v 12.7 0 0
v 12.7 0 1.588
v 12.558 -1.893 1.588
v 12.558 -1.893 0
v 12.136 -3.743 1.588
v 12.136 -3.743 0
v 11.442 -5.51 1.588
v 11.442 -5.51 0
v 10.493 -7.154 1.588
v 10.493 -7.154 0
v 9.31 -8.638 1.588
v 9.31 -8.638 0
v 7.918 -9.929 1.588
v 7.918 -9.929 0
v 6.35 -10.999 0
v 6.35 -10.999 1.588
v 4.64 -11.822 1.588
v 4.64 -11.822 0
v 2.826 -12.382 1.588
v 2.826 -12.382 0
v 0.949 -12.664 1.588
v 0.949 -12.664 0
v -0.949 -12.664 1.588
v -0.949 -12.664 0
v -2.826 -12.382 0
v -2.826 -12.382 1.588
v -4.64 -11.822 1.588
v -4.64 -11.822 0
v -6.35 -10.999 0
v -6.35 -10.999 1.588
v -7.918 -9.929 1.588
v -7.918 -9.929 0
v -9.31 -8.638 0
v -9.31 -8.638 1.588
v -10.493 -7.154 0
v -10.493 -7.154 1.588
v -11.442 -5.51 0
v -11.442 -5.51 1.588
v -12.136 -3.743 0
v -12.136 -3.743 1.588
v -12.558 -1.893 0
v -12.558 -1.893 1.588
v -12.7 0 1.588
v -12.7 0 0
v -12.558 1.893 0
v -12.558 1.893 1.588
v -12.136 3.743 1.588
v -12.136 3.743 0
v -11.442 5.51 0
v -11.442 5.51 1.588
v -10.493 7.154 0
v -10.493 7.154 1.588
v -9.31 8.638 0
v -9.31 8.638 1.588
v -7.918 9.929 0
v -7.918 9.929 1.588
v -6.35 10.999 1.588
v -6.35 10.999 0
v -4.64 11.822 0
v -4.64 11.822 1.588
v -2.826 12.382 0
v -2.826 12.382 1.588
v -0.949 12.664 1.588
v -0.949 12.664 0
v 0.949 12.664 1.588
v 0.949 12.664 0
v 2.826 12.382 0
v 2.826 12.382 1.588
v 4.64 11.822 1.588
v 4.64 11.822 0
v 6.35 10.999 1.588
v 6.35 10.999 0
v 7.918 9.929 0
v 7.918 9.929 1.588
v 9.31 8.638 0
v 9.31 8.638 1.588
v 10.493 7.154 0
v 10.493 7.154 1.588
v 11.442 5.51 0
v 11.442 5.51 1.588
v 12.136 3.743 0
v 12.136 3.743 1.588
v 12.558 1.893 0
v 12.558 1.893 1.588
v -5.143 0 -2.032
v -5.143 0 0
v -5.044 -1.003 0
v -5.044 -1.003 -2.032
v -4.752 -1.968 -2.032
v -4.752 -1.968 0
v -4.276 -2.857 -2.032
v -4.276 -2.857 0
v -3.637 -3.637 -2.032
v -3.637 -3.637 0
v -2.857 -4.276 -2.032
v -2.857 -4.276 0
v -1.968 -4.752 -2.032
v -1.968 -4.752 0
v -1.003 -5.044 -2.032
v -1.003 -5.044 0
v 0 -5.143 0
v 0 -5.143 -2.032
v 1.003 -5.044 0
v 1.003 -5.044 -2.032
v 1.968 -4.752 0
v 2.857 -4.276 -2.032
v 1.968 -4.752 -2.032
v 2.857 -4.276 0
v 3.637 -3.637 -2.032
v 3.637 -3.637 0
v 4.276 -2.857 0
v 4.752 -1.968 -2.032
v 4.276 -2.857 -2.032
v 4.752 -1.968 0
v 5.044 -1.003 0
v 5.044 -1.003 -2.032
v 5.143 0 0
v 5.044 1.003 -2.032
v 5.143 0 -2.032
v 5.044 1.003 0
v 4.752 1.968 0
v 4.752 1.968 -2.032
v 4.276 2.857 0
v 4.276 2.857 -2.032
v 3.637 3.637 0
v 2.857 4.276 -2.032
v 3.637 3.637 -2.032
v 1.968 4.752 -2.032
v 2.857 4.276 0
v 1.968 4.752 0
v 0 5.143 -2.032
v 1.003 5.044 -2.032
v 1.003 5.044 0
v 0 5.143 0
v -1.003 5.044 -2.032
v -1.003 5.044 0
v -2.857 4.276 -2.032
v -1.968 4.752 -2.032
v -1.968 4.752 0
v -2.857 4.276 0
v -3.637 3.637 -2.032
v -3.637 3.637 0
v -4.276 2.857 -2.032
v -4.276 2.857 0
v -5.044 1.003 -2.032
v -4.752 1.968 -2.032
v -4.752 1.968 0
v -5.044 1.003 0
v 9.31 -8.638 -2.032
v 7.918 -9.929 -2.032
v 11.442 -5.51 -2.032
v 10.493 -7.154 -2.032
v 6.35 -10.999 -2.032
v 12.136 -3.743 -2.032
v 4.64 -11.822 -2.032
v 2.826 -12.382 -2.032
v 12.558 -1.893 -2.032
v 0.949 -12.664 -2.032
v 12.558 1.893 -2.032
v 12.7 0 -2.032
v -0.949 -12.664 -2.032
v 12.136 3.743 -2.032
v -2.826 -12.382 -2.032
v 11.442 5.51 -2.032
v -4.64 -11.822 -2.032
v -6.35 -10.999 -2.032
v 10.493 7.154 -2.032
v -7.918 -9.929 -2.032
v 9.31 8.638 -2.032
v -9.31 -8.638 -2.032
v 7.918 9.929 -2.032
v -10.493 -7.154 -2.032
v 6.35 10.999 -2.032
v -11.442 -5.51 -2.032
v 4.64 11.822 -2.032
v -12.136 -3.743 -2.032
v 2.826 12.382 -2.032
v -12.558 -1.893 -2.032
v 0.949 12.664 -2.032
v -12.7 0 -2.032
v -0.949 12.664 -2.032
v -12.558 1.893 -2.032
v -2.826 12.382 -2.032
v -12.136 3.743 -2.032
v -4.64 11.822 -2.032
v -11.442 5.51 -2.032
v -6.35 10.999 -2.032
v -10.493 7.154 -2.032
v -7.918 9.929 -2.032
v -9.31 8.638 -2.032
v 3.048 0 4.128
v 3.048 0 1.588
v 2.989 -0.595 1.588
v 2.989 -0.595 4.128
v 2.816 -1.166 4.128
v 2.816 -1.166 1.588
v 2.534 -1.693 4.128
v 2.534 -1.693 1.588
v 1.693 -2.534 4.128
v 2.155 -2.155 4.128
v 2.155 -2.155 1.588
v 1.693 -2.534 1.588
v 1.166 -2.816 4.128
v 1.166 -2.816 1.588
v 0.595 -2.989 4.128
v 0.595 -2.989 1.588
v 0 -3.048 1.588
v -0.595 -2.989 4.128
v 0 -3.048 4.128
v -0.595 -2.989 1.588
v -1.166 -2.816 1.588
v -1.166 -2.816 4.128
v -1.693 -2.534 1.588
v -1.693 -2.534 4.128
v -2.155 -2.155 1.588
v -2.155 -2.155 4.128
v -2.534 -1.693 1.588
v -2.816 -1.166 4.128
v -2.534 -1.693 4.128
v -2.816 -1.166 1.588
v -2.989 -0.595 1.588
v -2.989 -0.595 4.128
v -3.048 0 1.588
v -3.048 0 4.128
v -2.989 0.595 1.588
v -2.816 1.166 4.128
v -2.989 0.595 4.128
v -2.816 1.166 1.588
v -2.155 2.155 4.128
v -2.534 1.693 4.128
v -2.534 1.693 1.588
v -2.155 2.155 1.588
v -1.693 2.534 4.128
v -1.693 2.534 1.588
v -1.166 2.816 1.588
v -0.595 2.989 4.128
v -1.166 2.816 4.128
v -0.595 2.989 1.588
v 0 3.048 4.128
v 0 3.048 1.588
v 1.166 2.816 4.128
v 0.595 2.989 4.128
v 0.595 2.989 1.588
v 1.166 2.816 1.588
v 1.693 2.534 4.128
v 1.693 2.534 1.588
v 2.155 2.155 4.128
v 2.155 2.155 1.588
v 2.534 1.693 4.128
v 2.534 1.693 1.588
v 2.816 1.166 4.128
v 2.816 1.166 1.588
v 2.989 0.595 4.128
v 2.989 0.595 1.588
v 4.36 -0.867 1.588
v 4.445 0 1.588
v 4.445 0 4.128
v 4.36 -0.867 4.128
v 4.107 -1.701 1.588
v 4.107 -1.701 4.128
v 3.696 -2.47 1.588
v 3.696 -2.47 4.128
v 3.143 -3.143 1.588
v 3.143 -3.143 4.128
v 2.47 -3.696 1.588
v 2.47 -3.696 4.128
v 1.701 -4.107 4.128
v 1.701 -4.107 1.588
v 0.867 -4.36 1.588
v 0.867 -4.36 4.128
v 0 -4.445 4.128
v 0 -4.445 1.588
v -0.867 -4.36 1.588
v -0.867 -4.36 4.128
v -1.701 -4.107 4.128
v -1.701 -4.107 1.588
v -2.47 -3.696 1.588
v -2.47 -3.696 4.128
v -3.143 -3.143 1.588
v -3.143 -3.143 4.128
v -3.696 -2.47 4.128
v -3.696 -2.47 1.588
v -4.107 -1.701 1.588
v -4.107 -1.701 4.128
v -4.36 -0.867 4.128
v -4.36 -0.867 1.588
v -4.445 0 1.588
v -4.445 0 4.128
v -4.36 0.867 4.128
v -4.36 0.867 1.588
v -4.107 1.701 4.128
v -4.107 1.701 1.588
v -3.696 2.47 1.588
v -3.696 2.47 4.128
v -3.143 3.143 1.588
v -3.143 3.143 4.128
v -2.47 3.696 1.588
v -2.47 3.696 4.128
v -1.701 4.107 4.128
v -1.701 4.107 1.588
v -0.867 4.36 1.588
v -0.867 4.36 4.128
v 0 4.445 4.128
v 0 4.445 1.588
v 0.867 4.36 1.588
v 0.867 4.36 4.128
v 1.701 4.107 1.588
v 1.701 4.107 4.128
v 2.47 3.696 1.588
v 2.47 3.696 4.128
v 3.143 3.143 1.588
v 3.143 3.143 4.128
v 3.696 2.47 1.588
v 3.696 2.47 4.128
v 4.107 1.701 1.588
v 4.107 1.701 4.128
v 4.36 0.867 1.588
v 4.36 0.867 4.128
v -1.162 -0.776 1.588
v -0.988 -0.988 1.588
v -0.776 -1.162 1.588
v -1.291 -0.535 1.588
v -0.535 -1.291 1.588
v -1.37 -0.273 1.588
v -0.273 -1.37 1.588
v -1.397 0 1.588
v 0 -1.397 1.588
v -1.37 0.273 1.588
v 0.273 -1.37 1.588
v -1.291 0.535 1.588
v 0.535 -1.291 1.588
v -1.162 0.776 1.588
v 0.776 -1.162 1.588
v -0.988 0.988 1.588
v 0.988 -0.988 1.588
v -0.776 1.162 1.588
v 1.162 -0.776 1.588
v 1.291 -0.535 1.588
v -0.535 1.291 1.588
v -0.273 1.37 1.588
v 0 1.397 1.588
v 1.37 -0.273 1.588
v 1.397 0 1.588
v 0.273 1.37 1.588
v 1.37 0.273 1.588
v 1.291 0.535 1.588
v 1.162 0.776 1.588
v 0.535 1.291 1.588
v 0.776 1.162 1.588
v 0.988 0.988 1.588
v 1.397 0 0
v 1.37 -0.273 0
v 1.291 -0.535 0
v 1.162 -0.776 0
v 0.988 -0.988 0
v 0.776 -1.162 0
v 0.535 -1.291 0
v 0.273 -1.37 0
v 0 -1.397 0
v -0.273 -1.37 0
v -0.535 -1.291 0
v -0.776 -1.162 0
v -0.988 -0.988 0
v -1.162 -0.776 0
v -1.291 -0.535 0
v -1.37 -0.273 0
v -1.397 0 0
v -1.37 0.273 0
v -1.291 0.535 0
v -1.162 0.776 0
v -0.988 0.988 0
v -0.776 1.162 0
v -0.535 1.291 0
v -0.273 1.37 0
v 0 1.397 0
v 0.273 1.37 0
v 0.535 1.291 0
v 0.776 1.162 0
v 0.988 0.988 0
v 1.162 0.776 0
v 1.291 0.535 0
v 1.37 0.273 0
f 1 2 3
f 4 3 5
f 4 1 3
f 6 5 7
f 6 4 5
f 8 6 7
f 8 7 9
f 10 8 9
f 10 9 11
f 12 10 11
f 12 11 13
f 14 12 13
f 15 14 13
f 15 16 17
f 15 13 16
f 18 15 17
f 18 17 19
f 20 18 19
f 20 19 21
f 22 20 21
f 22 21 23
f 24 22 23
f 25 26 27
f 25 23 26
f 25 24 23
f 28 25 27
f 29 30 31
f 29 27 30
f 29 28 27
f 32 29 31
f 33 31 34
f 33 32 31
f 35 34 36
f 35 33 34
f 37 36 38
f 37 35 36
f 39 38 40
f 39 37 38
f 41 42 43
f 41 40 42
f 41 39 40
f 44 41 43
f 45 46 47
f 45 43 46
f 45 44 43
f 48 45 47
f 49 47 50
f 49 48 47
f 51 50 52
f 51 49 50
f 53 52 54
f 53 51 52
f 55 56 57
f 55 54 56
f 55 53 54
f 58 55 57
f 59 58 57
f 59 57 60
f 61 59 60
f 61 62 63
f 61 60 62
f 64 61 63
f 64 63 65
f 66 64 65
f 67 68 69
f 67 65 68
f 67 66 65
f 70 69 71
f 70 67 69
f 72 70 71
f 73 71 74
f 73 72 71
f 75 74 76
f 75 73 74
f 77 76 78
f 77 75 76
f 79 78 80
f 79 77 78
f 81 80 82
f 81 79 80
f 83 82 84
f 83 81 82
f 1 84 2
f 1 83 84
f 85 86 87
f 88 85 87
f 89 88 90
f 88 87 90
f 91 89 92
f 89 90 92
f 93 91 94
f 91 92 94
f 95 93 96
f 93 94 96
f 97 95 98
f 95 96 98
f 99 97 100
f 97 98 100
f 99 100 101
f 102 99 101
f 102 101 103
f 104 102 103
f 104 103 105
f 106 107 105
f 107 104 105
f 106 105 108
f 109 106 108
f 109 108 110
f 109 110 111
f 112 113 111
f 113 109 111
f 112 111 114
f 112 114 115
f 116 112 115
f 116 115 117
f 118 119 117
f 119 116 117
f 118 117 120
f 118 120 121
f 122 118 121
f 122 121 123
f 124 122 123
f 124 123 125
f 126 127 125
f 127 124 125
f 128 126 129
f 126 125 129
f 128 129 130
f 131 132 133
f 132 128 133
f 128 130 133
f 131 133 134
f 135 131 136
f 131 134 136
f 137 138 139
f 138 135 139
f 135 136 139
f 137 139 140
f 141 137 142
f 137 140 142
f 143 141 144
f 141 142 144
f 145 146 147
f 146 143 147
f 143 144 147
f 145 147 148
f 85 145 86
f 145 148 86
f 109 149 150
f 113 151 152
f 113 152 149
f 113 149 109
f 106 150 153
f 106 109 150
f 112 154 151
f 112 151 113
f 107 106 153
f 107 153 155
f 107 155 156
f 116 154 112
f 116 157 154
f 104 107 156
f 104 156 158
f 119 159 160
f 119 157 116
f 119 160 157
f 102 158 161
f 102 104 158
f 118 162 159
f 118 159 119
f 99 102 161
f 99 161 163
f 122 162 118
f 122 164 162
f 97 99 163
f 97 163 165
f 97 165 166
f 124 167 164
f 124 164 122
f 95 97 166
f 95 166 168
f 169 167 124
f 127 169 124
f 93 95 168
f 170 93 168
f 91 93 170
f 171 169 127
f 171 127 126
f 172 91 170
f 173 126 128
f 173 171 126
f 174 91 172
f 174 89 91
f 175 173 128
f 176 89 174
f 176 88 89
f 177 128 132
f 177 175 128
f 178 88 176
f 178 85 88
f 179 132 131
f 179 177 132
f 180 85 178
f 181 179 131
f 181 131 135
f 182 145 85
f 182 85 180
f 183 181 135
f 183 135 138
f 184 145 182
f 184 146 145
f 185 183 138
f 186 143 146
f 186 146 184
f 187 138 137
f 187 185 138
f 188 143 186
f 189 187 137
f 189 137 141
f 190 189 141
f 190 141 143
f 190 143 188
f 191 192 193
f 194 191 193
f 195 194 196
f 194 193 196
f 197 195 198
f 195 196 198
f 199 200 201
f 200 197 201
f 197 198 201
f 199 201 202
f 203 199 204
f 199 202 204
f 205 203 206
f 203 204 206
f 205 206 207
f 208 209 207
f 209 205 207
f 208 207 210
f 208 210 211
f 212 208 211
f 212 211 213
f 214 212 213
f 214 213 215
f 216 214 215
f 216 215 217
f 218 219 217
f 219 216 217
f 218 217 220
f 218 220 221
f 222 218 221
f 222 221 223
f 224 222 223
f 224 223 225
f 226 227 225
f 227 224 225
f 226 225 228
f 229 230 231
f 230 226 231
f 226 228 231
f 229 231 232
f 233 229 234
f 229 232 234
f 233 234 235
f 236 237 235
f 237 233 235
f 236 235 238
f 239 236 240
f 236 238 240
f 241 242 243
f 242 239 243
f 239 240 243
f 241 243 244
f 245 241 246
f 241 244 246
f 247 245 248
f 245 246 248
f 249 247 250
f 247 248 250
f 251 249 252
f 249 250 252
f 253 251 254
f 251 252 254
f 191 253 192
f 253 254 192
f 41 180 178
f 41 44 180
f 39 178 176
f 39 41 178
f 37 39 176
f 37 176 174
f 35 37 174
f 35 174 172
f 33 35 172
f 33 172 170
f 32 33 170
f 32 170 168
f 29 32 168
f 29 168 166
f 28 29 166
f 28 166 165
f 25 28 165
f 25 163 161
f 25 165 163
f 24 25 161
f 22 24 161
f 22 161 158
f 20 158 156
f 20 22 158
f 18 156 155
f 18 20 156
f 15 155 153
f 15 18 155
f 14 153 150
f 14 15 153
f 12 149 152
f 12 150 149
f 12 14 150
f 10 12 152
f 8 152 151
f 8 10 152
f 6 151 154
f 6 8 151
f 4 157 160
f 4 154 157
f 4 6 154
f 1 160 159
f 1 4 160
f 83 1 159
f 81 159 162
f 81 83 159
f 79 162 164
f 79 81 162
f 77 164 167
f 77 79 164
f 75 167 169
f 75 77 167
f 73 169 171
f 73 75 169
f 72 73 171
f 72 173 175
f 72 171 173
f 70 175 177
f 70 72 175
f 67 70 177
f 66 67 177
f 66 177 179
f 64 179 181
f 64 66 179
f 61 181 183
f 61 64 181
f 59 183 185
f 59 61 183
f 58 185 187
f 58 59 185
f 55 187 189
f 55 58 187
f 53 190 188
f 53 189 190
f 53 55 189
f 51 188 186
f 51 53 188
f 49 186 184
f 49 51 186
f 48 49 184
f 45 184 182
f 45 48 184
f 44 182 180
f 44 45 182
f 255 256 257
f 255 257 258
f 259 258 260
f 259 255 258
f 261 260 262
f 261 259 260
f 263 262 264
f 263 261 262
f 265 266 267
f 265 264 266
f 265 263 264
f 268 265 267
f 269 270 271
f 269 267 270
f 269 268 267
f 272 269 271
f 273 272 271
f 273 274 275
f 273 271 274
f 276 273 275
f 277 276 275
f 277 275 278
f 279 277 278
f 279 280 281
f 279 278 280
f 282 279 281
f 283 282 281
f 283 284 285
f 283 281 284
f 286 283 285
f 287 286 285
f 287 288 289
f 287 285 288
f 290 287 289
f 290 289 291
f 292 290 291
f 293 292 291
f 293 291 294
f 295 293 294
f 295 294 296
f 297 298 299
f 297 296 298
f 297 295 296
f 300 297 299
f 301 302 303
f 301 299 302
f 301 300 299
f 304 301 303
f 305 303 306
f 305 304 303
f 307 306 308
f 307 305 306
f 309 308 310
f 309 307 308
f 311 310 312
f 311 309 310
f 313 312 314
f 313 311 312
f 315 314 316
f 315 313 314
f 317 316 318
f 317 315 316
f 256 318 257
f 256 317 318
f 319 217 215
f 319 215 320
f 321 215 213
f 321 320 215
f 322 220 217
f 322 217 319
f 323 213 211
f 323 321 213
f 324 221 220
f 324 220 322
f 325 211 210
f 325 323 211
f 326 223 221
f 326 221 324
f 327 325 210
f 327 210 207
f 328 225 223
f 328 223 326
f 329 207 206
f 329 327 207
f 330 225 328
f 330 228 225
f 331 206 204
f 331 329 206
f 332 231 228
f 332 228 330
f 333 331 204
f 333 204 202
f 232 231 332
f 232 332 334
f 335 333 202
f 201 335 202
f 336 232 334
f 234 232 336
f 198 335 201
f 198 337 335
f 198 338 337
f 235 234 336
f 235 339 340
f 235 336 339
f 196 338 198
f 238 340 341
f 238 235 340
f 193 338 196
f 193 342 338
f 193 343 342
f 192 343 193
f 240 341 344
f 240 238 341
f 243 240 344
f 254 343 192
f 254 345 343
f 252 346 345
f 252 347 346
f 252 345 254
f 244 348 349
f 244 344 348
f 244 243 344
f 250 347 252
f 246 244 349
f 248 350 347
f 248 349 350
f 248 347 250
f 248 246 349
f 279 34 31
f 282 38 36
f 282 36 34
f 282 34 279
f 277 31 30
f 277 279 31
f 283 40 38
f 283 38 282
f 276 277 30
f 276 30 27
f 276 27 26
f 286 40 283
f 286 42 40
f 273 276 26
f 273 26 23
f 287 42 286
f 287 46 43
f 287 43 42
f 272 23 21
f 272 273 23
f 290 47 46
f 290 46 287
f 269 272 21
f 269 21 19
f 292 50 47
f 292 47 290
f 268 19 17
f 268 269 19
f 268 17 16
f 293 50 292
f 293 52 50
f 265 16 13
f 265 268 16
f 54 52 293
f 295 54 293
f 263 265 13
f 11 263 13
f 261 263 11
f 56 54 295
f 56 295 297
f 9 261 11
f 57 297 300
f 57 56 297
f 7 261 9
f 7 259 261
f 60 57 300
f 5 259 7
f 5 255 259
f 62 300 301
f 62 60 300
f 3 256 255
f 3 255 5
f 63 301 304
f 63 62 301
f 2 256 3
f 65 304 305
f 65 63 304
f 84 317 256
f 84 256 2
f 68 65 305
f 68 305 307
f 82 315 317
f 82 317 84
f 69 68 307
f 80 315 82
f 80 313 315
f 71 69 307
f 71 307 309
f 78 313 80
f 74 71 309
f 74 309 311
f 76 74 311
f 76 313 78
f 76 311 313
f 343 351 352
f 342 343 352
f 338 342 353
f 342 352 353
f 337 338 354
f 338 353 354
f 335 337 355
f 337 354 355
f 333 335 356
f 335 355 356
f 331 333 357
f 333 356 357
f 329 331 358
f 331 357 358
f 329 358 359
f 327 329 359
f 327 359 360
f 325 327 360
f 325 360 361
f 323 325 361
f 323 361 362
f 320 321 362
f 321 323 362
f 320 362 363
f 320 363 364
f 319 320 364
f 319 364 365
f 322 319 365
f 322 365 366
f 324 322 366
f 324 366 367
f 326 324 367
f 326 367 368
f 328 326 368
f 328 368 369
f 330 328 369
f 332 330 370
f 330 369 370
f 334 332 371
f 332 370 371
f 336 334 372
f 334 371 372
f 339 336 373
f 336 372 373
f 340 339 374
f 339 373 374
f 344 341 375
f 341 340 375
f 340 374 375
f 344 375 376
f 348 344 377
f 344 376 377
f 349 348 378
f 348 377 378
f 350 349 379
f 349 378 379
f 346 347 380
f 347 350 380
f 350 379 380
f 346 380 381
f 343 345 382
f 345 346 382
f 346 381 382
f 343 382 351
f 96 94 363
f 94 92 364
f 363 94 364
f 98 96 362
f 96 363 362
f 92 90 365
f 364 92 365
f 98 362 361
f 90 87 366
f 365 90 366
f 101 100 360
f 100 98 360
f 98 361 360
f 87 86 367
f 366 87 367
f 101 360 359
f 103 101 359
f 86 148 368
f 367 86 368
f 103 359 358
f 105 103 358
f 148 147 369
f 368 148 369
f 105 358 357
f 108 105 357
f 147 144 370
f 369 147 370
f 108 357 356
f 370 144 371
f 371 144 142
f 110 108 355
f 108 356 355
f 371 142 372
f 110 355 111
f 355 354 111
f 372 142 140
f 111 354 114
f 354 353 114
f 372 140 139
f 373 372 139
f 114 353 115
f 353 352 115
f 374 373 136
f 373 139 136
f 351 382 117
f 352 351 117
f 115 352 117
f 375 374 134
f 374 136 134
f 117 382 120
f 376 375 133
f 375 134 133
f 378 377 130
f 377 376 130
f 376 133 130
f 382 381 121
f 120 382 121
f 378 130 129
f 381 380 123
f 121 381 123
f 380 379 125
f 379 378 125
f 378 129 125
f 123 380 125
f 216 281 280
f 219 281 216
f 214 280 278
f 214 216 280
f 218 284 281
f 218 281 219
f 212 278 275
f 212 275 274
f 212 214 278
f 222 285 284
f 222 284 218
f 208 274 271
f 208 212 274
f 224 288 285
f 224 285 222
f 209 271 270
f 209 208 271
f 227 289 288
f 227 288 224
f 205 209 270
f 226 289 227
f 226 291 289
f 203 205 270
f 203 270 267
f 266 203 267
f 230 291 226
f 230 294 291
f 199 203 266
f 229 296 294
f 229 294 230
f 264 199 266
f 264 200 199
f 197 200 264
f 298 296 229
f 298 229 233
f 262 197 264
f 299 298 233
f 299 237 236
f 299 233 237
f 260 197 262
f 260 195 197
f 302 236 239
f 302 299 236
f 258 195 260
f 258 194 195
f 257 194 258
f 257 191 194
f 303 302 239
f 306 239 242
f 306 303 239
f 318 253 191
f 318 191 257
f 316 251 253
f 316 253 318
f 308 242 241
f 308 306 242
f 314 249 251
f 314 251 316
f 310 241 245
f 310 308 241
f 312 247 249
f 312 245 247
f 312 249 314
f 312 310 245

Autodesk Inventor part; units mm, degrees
ref_plane "YZ Plane" through (0, 0, 0) normal (1, 0, 0) x (0, 1, 0)
ref_plane "XZ Plane" through (0, 0, 0) normal (0, 1, 0) x (-1, 0, 0)
ref_plane "XY Plane" through (0, 0, 0) normal (0, 0, 1) x (1, 0, 0)
sketch "Sketch1" plane through (0, 0, 0) normal (0, 0, 1) x (1, 0, 0)
  circle A0 centre (0, 0) radius 12.7
  circle A1 centre (0, 0) radius 1.397
  dimension "d0" = 25.4
  dimension "d1" = 2.794
extrude "Extrusion1" add sketch "Sketch1" along normal blind 1.5875
sketch "Sketch2" plane through (0, 0, 1.5875) normal (0, 0, 1) x (1, 0, 0)
  circle A0 centre (0, 0) radius 3.048
  circle A1 centre (0, 0) radius 4.445
  dimension "d4" = 6.096
  dimension "d5" = 8.89
extrude "Extrusion2" add sketch "Sketch2" along normal blind 2.54
sketch "Sketch3" plane through (0, 0, 0) normal (0, 0, -1) x (-1, 0, 0)
  circle A0 centre (0, 0) radius 12.7
  circle A1 centre (0, 0) radius 5.1432
  dimension "d8" = 25.4
extrude "Extrusion3" add sketch "Sketch3" along normal blind 2.032
equation "\"d0\" = hornD"
equation "\"d1\" = hornS"
equation "\"d2\" = hornT"
equation "\"d4\" = hornID"
equation "\"d5\" = hornOD"
equation "\"d6\" = hornH"
equation "\"d8\" = spoolD"
equation "\"d9\" = inset"
equation "\"spoolD\" = 25.4"
equation "\"hubD\" = 6.35"
equation "\"spoolT\" = 1.5875"
equation "\"hubH\" = 6.35"
equation "\"hornD\" = 25.4"
equation "\"hornT\" = 1.5875"
equation "\"hornS\" = 2.794"
equation "\"hornID\" = 6.096"
equation "\"hornOD\" = 8.89"
equation "\"hornH\" = 2.54"
equation "\"inset\" = 2.032"
equation "\"insetD\" = 5.842"
equation "\"servMD\" = 3.175"
equation "\"servMW\" = 10.033"
equation "\"servML\" = 49.784"
equation "\"servW\" = 20.1168"
equation "\"servL\" = 40.5892"
equation "\"housL\" = 53.975"
equation "\"housW\" = 28.575"
equation "\"housT\" = 2.54"
equation "\"housBT\" = 1.5875"
equation "\"housH\" = 39.116"
equation "\"guideW\" = 9.144"
equation "\"guideD\" = 3.175"
equation "\"guideH\" = 23.114"
properties part number "Horn"
